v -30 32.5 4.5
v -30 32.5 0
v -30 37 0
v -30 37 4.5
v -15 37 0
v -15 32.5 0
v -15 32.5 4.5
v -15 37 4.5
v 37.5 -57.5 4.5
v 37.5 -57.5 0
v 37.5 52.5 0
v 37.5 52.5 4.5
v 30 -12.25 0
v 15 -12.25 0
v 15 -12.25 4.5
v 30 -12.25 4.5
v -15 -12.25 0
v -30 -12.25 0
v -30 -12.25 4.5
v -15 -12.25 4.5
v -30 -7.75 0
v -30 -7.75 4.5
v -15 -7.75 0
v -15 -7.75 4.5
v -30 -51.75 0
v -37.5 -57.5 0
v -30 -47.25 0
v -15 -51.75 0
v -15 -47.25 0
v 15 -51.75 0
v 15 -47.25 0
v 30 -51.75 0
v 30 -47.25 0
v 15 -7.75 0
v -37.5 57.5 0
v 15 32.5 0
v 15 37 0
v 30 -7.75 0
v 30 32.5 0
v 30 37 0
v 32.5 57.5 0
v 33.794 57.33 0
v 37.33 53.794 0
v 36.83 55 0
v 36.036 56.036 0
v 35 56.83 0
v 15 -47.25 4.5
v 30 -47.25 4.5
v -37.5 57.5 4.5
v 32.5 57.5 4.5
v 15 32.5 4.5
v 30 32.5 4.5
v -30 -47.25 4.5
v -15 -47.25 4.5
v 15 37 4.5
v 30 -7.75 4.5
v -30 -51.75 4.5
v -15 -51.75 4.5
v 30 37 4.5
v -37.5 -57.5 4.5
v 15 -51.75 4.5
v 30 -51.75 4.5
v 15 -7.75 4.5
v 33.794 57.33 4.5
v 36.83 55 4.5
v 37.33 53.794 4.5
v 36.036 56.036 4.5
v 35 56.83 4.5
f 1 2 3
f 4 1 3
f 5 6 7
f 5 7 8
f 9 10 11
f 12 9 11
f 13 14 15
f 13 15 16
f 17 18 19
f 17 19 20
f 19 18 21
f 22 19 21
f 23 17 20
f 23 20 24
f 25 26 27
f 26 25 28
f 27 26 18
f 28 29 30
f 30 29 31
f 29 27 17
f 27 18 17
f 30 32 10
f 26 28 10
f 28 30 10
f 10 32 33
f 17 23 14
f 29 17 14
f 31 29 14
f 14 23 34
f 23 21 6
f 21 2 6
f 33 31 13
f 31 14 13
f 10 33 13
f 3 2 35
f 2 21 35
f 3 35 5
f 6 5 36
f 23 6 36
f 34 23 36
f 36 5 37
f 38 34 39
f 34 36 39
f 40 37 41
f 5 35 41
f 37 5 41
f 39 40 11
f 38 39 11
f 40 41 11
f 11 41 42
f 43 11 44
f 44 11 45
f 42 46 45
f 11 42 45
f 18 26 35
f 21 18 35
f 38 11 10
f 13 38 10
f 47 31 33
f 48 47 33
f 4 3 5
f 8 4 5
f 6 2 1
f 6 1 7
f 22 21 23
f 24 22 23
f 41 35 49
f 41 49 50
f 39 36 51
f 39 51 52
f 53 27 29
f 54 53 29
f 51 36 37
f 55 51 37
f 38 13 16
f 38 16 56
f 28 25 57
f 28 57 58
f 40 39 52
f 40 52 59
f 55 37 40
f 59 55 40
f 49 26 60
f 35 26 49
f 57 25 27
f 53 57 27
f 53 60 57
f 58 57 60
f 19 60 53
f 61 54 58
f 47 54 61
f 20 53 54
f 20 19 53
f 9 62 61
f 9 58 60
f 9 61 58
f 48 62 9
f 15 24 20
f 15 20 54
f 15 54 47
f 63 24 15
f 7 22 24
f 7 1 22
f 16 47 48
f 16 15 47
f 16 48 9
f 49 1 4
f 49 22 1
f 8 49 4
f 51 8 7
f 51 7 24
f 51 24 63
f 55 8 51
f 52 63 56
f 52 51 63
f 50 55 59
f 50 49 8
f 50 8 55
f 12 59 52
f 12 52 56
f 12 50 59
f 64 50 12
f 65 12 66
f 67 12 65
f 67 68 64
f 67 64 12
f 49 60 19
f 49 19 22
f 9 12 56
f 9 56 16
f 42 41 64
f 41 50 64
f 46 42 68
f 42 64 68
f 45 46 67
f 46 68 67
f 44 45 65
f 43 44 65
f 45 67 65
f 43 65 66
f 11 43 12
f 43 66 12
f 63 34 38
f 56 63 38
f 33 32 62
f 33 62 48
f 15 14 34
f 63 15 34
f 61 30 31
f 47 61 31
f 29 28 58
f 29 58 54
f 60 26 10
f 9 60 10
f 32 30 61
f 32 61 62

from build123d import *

# Parameters (mm, degrees)
SKETCH1_W           = 75
SKETCH1_H           = 115
SKETCH1_W_2         = 15
SKETCH1_H_2         = 4.5
BOSS_EXTRUDE1_DEPTH = 4.5
FILLET1_R           = 5


with BuildPart() as part:
    # Sketch1 → Boss-Extrude1 (new body)
    with BuildSketch(Plane.XY):
        Rectangle(SKETCH1_W, SKETCH1_H)
        with Locations((22.5, 34.75)):
            Rectangle(SKETCH1_W_2, SKETCH1_H_2, mode=Mode.SUBTRACT)
        with Locations((-22.5, 34.75)):
            Rectangle(SKETCH1_W_2, SKETCH1_H_2, mode=Mode.SUBTRACT)
        with Locations((22.5, -10)):
            Rectangle(SKETCH1_W_2, SKETCH1_H_2, mode=Mode.SUBTRACT)
        with Locations((-22.5, -10)):
            Rectangle(SKETCH1_W_2, SKETCH1_H_2, mode=Mode.SUBTRACT)
        with Locations((22.5, -49.5)):
            Rectangle(SKETCH1_W_2, SKETCH1_H_2, mode=Mode.SUBTRACT)
        with Locations((-22.5, -49.5)):
            Rectangle(SKETCH1_W_2, SKETCH1_H_2, mode=Mode.SUBTRACT)
    extrude(amount=BOSS_EXTRUDE1_DEPTH)

    # Fillet1
    fillet1_edges = [part.edges().sort_by_distance(p)[0] for p in [
        (37.5, 57.5, 2.25),
    ]]
    fillet(fillet1_edges, radius=FILLET1_R)


solid = part.part
